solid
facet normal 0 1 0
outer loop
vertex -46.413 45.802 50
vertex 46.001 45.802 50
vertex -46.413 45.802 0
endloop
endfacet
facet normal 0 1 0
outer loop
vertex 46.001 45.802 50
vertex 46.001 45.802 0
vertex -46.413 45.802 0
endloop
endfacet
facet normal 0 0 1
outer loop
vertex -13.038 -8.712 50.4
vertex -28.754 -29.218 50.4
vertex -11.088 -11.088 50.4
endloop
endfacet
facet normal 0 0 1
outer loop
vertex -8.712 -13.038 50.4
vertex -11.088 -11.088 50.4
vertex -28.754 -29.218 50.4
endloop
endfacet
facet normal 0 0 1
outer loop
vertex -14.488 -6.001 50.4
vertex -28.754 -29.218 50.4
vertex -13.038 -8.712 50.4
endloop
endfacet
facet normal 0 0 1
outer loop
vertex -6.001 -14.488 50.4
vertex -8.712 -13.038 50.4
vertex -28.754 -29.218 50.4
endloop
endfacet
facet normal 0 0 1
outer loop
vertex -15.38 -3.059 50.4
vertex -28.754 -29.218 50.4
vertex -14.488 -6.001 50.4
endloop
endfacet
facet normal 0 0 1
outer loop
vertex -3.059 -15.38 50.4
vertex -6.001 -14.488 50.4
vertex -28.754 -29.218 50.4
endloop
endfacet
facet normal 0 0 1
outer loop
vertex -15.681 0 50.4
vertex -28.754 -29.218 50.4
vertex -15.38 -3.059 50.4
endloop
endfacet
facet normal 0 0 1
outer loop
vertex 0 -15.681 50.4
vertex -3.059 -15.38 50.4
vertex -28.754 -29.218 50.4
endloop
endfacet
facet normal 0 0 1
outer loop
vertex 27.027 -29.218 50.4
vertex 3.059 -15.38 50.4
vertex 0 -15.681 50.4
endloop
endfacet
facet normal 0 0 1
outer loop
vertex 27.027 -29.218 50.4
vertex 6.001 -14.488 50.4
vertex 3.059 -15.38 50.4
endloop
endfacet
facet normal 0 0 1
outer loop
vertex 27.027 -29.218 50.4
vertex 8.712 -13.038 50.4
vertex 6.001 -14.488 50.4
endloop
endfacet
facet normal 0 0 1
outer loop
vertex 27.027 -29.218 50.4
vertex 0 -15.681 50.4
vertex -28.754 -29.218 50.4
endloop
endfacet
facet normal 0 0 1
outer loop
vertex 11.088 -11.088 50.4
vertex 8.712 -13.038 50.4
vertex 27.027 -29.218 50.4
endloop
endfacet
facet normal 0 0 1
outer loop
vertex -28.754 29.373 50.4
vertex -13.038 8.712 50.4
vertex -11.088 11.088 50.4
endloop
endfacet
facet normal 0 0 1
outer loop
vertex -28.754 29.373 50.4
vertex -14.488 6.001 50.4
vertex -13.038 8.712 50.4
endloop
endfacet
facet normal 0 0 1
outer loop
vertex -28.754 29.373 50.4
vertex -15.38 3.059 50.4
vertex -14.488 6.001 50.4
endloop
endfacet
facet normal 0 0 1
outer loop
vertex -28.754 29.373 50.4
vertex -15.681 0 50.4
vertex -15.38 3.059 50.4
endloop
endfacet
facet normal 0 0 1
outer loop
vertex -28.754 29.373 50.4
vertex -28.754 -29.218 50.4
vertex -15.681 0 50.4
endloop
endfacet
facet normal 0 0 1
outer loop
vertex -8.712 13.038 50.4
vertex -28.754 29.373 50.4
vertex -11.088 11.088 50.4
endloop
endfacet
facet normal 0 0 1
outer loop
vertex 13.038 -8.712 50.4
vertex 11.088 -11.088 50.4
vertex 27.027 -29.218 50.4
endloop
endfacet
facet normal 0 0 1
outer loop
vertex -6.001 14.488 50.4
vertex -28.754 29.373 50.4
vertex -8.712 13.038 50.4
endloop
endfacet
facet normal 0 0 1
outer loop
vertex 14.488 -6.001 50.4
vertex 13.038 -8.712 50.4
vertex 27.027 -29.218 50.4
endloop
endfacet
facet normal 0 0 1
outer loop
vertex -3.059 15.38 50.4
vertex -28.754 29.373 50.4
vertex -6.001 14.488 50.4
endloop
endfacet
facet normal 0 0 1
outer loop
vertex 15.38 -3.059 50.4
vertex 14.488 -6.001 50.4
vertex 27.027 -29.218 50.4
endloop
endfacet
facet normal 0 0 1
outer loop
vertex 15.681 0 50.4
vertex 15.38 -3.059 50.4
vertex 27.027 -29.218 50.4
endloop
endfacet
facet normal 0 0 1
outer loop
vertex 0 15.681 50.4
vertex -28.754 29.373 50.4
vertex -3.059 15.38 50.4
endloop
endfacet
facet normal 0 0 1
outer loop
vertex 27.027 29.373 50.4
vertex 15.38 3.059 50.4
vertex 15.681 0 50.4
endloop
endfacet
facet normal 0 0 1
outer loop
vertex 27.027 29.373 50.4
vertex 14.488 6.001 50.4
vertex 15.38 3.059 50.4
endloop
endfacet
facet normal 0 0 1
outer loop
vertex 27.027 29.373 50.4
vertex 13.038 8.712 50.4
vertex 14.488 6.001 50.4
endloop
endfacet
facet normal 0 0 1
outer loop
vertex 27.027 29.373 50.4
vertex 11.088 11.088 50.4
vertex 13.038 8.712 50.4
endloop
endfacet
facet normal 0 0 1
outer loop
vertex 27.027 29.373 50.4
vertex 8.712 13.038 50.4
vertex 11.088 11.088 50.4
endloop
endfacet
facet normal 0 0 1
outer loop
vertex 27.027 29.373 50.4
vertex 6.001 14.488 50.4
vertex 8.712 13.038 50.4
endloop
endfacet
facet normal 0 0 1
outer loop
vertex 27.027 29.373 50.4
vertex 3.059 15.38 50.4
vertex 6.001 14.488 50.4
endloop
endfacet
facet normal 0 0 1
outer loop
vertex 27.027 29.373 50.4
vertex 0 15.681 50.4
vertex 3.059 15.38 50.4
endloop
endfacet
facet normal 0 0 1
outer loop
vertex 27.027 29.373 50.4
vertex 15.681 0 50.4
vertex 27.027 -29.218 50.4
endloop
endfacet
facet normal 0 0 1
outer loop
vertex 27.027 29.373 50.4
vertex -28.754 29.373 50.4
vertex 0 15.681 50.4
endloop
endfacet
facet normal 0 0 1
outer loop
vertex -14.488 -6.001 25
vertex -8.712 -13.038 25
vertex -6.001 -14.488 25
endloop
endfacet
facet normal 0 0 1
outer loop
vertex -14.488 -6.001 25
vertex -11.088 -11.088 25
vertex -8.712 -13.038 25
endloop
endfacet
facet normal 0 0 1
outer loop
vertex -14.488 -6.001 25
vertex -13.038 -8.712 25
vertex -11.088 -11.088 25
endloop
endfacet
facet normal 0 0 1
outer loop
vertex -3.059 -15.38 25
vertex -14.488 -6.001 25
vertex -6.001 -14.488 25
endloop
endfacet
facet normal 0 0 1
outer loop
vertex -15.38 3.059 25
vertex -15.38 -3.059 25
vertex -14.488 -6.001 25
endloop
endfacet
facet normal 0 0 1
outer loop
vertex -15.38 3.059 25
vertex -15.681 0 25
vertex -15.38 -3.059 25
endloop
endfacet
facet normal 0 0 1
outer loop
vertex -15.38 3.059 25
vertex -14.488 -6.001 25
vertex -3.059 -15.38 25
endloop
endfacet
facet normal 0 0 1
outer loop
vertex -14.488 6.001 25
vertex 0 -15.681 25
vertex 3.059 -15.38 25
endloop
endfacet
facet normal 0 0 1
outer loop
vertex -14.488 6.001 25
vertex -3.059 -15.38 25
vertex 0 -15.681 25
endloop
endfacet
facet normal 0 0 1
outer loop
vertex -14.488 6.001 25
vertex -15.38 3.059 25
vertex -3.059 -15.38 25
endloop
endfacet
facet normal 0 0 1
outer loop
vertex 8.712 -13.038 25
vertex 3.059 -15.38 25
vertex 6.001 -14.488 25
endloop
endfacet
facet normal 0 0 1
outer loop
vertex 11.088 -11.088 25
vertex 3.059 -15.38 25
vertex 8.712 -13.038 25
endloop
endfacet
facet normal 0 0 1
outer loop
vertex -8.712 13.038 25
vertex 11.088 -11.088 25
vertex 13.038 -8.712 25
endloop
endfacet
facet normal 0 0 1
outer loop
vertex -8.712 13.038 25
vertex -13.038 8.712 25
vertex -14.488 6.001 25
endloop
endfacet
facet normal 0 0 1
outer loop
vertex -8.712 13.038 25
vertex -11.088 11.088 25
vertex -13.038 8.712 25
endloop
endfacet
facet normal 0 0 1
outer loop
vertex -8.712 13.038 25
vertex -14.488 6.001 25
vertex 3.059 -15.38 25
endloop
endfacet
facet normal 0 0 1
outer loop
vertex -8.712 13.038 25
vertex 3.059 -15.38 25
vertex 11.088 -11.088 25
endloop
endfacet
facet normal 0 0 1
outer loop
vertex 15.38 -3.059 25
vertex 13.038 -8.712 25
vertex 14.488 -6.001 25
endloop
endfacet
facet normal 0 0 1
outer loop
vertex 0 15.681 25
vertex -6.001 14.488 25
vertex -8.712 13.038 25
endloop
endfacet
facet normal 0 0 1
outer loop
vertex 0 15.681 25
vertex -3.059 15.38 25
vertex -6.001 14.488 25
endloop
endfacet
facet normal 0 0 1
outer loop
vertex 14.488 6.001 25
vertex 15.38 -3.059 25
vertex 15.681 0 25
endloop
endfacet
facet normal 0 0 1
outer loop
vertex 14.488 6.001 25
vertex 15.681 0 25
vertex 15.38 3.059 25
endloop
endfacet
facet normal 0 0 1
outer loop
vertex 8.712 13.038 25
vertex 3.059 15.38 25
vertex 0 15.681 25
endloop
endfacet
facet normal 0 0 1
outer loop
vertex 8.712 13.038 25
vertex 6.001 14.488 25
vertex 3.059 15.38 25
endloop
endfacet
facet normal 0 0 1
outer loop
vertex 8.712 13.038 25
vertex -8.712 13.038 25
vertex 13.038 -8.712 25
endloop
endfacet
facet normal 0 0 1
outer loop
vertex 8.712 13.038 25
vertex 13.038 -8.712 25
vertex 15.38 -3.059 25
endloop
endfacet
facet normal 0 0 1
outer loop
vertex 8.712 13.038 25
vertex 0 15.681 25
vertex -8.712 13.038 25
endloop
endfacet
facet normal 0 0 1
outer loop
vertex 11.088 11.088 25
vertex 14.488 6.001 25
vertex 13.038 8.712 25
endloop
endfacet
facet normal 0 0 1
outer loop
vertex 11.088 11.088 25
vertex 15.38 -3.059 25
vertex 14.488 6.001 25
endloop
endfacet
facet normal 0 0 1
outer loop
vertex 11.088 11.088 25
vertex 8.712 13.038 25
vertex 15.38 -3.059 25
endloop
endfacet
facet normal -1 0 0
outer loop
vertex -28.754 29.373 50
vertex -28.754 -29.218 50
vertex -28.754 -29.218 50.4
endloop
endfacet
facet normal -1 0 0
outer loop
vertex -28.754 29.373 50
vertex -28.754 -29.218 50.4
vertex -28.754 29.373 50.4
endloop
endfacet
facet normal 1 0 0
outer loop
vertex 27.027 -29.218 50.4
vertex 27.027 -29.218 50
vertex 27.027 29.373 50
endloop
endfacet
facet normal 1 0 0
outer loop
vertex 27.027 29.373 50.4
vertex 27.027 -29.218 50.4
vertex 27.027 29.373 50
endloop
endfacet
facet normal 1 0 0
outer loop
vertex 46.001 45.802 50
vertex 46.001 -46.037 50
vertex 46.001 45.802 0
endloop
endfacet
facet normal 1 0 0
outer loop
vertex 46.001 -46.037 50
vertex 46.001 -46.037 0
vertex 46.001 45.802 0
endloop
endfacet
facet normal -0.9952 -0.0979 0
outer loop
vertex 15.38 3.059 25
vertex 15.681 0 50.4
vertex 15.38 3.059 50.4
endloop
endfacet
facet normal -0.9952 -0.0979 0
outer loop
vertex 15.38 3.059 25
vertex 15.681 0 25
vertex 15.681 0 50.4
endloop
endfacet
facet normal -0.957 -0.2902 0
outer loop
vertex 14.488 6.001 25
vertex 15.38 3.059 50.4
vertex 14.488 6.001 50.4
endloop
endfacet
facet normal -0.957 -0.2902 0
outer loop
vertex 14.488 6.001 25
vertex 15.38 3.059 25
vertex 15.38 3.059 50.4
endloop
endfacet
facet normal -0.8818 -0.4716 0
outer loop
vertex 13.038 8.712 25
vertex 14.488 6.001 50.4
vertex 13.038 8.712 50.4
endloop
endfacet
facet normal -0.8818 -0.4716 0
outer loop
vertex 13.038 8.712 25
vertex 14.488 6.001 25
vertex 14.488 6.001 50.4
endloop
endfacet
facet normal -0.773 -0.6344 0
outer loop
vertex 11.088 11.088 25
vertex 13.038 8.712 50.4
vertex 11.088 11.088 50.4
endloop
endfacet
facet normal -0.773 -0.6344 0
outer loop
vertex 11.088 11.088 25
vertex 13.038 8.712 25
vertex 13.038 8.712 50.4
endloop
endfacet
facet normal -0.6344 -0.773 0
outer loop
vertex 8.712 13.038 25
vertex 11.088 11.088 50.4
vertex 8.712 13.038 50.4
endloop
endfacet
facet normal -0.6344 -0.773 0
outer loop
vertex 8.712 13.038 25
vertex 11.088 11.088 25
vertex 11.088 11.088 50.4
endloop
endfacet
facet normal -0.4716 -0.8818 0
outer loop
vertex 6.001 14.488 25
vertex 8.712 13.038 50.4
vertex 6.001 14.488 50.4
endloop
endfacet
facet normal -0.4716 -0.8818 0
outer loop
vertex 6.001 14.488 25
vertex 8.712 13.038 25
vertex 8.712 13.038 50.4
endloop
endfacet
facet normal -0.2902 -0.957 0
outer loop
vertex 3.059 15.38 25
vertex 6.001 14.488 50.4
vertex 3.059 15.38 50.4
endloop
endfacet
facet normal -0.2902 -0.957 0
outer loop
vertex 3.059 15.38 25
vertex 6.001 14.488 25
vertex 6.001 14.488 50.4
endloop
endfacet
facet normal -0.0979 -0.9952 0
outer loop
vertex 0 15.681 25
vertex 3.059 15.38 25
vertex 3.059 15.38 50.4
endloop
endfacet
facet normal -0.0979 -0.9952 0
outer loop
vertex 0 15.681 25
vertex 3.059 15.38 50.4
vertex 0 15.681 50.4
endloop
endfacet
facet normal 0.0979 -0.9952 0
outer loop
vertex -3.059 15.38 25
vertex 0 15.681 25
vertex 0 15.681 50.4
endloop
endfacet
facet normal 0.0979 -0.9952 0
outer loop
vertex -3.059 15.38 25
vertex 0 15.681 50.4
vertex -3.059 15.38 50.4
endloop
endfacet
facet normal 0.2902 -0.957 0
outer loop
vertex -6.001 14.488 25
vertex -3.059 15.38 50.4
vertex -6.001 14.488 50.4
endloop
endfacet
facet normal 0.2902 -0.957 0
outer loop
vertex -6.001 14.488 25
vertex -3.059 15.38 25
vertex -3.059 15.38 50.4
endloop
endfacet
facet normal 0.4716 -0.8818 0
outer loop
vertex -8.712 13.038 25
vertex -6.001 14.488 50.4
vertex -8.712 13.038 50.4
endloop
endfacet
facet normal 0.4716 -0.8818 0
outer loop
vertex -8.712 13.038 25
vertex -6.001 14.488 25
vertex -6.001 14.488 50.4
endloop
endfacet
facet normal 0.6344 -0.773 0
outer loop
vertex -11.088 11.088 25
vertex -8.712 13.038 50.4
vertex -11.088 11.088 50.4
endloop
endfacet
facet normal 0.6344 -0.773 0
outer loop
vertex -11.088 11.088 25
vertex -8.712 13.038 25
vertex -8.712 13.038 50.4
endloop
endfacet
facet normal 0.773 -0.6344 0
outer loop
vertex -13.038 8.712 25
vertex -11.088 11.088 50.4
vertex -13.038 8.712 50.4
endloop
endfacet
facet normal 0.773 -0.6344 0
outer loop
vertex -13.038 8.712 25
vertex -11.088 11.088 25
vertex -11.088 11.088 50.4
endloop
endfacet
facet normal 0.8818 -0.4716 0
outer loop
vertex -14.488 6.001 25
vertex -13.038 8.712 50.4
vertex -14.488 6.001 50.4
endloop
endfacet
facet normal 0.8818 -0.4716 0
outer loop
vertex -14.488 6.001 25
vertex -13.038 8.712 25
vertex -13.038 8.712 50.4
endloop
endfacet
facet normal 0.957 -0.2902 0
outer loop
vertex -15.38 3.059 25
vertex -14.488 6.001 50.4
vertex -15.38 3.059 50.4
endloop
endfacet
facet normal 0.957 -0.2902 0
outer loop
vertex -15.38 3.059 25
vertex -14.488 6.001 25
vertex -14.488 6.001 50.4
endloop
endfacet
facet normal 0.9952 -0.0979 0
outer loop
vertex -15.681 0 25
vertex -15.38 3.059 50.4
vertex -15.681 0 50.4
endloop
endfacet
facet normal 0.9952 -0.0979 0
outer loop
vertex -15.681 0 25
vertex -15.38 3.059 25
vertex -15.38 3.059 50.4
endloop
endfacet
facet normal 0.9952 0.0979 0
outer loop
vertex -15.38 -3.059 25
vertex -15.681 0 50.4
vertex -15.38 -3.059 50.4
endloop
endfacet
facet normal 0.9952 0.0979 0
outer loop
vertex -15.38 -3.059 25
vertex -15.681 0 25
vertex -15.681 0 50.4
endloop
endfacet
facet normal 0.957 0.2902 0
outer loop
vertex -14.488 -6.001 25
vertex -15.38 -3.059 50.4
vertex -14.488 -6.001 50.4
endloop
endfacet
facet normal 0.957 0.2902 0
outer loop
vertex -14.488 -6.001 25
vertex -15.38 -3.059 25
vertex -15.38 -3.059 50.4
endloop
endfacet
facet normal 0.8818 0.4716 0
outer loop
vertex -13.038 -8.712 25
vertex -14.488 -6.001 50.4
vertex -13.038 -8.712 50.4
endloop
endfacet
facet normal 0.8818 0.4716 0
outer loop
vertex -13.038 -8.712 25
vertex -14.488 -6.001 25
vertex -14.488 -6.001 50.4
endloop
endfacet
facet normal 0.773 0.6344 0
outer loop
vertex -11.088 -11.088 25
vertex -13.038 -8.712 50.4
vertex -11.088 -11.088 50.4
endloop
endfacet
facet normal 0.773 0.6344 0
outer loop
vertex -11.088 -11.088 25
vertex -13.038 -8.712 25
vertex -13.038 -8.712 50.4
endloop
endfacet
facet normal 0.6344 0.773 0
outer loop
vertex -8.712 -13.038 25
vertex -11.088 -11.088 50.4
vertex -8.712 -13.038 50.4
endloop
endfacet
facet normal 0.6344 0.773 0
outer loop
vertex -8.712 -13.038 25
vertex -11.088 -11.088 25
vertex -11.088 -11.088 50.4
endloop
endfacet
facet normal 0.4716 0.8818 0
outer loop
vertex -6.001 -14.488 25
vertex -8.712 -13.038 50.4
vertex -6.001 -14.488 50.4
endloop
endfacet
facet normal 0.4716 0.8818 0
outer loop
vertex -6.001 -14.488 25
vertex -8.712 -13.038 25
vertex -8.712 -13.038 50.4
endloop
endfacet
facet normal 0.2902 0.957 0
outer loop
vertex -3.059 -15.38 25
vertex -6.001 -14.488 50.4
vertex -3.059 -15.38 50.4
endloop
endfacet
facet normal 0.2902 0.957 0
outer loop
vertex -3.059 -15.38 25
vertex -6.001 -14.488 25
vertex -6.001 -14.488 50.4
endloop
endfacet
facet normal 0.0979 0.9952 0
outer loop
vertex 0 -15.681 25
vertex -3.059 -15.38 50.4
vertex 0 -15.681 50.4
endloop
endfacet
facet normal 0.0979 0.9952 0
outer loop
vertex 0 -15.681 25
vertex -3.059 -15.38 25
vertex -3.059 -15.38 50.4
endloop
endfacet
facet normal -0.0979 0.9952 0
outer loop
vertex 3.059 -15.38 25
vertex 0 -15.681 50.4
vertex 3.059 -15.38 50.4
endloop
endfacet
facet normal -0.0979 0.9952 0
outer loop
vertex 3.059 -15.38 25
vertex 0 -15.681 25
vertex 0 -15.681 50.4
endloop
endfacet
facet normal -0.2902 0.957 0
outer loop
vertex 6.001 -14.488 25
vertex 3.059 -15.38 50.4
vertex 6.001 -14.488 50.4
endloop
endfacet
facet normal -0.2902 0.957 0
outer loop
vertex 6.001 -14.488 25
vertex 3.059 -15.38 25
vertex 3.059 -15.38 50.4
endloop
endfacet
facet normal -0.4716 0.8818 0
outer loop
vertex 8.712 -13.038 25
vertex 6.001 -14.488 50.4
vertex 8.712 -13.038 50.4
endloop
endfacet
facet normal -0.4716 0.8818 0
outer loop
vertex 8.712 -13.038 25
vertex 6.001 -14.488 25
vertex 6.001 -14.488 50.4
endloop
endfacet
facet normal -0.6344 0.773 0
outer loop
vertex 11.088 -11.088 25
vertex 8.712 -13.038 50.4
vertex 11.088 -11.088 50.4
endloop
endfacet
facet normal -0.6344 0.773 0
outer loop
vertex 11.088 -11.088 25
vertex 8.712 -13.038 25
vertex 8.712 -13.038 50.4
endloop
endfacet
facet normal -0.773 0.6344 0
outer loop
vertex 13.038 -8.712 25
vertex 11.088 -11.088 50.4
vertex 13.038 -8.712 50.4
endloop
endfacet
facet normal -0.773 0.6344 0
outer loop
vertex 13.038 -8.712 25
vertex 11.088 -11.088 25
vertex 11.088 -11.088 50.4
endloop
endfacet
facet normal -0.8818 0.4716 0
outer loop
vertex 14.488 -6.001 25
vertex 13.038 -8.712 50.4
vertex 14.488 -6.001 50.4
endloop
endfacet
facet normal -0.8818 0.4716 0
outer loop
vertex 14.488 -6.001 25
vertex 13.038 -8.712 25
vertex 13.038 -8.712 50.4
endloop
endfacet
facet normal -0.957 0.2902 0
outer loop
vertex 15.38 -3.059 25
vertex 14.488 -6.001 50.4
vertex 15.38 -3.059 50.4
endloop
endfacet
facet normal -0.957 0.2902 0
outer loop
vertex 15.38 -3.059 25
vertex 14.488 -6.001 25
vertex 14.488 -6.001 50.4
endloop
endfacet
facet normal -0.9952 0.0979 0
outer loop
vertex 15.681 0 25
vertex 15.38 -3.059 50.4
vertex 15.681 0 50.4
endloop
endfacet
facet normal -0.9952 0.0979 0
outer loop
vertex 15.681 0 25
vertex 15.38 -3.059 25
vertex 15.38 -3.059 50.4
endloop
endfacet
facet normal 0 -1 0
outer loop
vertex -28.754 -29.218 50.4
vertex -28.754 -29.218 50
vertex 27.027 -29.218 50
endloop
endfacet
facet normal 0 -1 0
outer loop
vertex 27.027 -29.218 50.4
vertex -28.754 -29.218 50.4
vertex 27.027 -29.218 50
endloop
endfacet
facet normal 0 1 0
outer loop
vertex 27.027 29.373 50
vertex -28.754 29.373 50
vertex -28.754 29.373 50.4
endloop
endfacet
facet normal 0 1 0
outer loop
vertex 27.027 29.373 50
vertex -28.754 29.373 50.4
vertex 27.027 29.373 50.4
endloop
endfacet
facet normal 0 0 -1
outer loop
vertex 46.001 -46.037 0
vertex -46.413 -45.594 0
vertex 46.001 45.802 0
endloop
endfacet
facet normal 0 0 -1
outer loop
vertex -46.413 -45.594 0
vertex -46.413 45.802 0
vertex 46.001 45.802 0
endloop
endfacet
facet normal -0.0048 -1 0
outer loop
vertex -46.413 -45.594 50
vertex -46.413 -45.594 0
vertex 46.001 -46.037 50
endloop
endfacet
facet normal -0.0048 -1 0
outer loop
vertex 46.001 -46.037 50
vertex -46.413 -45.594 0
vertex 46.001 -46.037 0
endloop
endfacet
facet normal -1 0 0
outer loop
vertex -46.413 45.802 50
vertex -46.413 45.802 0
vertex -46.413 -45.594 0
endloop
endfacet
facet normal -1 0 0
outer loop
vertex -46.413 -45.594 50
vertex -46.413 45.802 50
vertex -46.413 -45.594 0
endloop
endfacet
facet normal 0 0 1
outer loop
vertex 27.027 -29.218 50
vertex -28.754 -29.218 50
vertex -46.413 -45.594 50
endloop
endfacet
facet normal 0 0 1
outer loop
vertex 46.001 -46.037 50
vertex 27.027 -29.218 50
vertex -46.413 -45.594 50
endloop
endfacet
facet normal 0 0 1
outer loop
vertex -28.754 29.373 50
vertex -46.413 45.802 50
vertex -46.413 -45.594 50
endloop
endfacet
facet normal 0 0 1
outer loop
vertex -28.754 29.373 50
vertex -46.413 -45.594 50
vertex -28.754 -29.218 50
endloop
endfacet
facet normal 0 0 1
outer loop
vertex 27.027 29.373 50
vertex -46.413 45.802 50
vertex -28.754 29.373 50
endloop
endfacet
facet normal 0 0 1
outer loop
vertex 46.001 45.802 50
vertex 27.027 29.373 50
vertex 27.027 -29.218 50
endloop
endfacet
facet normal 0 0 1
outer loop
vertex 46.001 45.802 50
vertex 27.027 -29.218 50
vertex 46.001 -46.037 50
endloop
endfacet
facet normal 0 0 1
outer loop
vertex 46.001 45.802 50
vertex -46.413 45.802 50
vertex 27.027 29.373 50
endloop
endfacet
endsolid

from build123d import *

# Parameters (mm, degrees)
F0_W     = 55.7806007564
F0_H     = 58.5907548666
F0_R     = 15.6812666629
F1_DEPTH = 25.4
F3_DEPTH = 25
F4_DEPTH = 25


with BuildPart() as f1:
    # F0 (on Top) → F1 (new body)
    with BuildSketch(Plane.XY):
        with Locations((-0.8635763079, 0.0774934888)):
            Rectangle(F0_W, F0_H)
        Circle(F0_R, mode=Mode.SUBTRACT)
    extrude(amount=F1_DEPTH)

    # F2 (on Top) → F3 (join)
    with BuildSketch(Plane.XY):
        Polygon((-46.4129857719, -45.5937832594), (46.0013560951, -46.0371151567), (46.0013560951, 45.8016321063), (-46.4129857719, 45.8016321063), align=None)
    extrude(amount=F3_DEPTH)

    # F4 (add): faces of the model
    f4_faces = [f1.faces().sort_by_distance(p)[0] for p in [
        (26.2177523788, 0.0774934888, 25.4),
        (-0.199564745, -44.5125917544, 25),
    ]]
    extrude(f4_faces, amount=F4_DEPTH)


solid = f1.part
